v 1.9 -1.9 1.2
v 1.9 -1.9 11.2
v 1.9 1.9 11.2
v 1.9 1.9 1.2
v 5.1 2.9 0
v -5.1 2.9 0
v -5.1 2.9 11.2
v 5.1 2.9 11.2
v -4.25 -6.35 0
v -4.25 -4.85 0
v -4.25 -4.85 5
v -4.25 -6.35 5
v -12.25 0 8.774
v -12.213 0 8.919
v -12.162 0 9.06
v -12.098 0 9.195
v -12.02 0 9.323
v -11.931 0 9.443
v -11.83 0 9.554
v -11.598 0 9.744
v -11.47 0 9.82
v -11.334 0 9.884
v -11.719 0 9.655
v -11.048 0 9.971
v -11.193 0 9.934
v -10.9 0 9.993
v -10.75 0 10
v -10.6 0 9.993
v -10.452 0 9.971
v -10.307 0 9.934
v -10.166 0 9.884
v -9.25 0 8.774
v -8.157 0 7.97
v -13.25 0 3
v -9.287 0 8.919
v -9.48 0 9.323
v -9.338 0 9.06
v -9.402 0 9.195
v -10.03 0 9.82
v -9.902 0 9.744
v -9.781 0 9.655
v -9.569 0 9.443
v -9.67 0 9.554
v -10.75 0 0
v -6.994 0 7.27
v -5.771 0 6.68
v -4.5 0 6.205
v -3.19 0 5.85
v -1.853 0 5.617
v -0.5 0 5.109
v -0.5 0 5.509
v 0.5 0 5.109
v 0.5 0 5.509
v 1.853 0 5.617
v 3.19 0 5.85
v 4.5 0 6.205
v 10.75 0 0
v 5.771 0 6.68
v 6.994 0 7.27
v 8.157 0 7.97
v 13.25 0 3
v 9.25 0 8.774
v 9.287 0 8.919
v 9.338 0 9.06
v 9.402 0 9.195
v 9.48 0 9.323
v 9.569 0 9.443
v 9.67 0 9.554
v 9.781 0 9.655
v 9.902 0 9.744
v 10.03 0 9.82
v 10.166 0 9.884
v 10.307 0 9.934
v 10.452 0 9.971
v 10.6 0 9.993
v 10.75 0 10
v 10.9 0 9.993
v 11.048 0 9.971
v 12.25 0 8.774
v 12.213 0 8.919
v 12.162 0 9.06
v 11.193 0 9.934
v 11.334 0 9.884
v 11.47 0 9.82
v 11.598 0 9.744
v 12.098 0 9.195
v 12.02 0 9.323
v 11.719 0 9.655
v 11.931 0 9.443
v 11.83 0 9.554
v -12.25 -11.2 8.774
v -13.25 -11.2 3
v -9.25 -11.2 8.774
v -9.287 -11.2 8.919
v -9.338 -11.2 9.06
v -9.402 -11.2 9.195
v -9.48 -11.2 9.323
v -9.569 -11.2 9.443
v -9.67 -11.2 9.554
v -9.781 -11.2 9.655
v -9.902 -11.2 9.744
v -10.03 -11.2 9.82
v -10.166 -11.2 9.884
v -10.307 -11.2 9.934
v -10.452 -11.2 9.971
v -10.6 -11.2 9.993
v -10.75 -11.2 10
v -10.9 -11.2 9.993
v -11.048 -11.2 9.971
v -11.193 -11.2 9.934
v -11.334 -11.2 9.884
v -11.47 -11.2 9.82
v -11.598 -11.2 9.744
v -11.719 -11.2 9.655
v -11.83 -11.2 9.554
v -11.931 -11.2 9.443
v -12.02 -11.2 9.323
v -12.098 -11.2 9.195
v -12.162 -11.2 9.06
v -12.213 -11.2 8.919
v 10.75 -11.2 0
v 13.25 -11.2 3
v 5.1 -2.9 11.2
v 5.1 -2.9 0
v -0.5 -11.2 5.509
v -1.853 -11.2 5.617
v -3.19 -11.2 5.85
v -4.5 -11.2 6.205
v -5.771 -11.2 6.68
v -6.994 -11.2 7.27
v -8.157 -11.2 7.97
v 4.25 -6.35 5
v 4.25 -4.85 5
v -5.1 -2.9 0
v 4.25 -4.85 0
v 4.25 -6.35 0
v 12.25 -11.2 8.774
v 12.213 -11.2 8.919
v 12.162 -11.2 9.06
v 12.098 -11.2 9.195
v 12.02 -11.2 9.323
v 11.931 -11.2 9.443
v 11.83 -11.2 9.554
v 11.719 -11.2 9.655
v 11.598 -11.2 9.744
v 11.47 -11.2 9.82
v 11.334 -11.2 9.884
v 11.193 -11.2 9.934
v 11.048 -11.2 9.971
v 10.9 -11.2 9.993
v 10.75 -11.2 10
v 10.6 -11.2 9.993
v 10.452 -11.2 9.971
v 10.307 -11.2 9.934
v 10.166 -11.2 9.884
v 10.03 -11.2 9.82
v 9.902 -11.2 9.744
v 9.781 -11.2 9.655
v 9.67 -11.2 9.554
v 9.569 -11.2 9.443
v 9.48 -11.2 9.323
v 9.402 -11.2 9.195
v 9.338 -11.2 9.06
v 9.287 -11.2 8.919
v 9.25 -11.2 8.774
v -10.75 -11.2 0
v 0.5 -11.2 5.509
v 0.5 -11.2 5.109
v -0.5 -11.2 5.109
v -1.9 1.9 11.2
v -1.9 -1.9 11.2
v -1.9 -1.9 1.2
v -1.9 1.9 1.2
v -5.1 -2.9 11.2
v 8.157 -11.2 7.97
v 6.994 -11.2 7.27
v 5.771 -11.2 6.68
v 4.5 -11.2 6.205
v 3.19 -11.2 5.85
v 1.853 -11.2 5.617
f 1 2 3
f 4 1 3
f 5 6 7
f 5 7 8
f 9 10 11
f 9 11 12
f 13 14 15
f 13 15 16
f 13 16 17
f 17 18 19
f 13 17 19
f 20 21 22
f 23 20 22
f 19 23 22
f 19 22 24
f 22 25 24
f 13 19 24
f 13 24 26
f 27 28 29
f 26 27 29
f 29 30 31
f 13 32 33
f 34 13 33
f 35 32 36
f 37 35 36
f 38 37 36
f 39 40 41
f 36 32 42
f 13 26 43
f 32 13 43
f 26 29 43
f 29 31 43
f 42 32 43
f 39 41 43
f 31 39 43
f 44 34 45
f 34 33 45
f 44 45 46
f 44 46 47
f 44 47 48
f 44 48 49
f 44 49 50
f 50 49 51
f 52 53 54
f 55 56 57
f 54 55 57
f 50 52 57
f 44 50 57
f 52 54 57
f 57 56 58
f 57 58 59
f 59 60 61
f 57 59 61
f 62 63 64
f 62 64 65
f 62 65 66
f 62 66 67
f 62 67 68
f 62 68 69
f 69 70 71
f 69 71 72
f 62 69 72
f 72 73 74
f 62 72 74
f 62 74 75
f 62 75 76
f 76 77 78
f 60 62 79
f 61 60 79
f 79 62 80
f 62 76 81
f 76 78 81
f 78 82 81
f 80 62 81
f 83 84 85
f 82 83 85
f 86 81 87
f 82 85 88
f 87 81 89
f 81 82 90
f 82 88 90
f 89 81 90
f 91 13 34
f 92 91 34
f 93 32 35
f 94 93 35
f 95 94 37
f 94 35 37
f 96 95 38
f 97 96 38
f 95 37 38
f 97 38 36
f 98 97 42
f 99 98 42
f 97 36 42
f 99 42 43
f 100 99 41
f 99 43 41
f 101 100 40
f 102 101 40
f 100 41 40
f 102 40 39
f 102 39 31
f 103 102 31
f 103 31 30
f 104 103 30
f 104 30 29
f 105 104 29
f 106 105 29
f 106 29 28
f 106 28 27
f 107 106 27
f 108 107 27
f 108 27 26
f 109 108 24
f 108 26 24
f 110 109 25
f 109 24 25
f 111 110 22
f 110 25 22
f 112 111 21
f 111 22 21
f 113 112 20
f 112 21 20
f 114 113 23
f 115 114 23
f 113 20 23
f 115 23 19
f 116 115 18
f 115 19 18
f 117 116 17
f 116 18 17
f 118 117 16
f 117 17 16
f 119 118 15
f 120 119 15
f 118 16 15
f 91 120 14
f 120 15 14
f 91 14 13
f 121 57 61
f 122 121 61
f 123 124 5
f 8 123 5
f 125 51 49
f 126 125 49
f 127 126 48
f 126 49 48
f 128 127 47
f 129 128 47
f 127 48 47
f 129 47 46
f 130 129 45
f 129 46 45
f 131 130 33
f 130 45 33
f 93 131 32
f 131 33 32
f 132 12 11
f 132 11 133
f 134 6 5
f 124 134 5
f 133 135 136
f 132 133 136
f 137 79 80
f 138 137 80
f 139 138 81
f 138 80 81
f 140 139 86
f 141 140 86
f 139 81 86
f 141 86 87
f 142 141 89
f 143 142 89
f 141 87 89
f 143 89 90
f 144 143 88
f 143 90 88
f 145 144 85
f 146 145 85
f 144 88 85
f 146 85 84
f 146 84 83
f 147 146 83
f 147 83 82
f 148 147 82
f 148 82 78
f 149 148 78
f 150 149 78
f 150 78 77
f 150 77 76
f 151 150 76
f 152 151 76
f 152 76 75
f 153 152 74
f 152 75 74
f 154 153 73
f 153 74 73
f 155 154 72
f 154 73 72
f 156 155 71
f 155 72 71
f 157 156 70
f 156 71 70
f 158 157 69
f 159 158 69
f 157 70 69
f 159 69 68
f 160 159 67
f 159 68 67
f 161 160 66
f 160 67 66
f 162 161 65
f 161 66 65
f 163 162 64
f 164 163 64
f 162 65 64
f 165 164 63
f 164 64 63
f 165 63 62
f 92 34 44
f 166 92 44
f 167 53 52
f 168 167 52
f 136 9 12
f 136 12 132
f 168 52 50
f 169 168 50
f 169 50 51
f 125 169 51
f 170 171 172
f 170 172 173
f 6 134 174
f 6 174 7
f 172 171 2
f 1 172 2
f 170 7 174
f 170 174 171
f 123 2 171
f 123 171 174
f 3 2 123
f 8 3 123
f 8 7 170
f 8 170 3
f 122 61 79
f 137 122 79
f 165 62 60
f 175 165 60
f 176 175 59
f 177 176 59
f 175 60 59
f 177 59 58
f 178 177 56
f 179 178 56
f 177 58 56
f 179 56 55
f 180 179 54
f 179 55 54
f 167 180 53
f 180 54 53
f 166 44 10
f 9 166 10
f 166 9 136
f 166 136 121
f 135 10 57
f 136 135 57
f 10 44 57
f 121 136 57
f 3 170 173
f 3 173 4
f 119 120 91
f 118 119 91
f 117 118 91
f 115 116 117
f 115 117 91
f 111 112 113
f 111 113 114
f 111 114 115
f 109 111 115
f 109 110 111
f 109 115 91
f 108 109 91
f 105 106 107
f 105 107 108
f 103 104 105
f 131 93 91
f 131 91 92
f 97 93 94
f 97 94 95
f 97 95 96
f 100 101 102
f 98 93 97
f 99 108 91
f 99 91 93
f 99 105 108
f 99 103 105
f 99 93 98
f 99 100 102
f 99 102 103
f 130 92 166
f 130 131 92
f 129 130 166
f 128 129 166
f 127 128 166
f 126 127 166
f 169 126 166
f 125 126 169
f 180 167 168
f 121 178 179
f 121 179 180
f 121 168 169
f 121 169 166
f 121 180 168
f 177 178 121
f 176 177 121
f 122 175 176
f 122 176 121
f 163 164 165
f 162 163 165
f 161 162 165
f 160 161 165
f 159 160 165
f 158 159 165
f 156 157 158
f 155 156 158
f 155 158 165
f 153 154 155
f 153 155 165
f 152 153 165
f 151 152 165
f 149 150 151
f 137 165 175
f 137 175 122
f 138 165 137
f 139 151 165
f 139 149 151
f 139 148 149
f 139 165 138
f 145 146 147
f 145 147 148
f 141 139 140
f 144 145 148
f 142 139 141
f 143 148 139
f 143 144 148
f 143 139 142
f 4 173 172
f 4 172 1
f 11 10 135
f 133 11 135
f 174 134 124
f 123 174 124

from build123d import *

# Parameters (mm, degrees)
F0_W     = 3.8
F0_H     = 3.8
F1_DEPTH = 1.2
F0_W_2   = 10.2
F0_H_2   = 5.8
F2_DEPTH = 11.2
F4_DEPTH = 11.2
F5_W     = 8.5
F5_H     = 1.5
F6_DEPTH = 5


with BuildPart() as f1:
    # F0 (on Top) → F1 (new body)
    with BuildSketch(Plane.XY):
        Rectangle(F0_W, F0_H)
    extrude(amount=F1_DEPTH)

    # F0 (on Top) → F2 (join)
    with BuildSketch(Plane.XY):
        Rectangle(F0_W_2, F0_H_2)
        Rectangle(F0_W, F0_H, mode=Mode.SUBTRACT)
    extrude(amount=F2_DEPTH)


with BuildPart() as f4:
    # F3 (on Front) → F4 (new body)
    with BuildSketch(Plane.XZ):
        with BuildLine():
            Line((-13.25, 3), (-10.75, 0))
            Line((-10.75, 0), (10.75, 0))
            Line((10.75, 0), (13.25, 3))
            Line((13.25, 3), (12.25, 8.774045))
            ThreePointArc((12.25, 8.774045), (10.75, 10), (9.25, 8.774045))
            ThreePointArc((9.25, 8.774045), (5.141164, 6.42809), (0.5, 5.508504))
            Line((0.5, 5.508504), (0.5, 5.108504))
            Line((0.5, 5.108504), (-0.5, 5.108504))
            Line((-0.5, 5.108504), (-0.5, 5.508504))
            ThreePointArc((-0.5, 5.508504), (-5.141164, 6.42809), (-9.25, 8.774045))
            ThreePointArc((-9.25, 8.774045), (-10.75, 10), (-12.25, 8.774045))
            Line((-12.25, 8.774045), (-13.25, 3))
        make_face()
    extrude(amount=F4_DEPTH)

    # F5 (on face) → F6 (cut)
    with BuildSketch(Plane(origin=(0, 0, 0), x_dir=(1, 0, 0), z_dir=(0, 0, -1))):
        with Locations((0, 5.6)):
            Rectangle(F5_W, F5_H)
    extrude(amount=-F6_DEPTH, mode=Mode.SUBTRACT)


solid = Compound([f1.part, f4.part])
